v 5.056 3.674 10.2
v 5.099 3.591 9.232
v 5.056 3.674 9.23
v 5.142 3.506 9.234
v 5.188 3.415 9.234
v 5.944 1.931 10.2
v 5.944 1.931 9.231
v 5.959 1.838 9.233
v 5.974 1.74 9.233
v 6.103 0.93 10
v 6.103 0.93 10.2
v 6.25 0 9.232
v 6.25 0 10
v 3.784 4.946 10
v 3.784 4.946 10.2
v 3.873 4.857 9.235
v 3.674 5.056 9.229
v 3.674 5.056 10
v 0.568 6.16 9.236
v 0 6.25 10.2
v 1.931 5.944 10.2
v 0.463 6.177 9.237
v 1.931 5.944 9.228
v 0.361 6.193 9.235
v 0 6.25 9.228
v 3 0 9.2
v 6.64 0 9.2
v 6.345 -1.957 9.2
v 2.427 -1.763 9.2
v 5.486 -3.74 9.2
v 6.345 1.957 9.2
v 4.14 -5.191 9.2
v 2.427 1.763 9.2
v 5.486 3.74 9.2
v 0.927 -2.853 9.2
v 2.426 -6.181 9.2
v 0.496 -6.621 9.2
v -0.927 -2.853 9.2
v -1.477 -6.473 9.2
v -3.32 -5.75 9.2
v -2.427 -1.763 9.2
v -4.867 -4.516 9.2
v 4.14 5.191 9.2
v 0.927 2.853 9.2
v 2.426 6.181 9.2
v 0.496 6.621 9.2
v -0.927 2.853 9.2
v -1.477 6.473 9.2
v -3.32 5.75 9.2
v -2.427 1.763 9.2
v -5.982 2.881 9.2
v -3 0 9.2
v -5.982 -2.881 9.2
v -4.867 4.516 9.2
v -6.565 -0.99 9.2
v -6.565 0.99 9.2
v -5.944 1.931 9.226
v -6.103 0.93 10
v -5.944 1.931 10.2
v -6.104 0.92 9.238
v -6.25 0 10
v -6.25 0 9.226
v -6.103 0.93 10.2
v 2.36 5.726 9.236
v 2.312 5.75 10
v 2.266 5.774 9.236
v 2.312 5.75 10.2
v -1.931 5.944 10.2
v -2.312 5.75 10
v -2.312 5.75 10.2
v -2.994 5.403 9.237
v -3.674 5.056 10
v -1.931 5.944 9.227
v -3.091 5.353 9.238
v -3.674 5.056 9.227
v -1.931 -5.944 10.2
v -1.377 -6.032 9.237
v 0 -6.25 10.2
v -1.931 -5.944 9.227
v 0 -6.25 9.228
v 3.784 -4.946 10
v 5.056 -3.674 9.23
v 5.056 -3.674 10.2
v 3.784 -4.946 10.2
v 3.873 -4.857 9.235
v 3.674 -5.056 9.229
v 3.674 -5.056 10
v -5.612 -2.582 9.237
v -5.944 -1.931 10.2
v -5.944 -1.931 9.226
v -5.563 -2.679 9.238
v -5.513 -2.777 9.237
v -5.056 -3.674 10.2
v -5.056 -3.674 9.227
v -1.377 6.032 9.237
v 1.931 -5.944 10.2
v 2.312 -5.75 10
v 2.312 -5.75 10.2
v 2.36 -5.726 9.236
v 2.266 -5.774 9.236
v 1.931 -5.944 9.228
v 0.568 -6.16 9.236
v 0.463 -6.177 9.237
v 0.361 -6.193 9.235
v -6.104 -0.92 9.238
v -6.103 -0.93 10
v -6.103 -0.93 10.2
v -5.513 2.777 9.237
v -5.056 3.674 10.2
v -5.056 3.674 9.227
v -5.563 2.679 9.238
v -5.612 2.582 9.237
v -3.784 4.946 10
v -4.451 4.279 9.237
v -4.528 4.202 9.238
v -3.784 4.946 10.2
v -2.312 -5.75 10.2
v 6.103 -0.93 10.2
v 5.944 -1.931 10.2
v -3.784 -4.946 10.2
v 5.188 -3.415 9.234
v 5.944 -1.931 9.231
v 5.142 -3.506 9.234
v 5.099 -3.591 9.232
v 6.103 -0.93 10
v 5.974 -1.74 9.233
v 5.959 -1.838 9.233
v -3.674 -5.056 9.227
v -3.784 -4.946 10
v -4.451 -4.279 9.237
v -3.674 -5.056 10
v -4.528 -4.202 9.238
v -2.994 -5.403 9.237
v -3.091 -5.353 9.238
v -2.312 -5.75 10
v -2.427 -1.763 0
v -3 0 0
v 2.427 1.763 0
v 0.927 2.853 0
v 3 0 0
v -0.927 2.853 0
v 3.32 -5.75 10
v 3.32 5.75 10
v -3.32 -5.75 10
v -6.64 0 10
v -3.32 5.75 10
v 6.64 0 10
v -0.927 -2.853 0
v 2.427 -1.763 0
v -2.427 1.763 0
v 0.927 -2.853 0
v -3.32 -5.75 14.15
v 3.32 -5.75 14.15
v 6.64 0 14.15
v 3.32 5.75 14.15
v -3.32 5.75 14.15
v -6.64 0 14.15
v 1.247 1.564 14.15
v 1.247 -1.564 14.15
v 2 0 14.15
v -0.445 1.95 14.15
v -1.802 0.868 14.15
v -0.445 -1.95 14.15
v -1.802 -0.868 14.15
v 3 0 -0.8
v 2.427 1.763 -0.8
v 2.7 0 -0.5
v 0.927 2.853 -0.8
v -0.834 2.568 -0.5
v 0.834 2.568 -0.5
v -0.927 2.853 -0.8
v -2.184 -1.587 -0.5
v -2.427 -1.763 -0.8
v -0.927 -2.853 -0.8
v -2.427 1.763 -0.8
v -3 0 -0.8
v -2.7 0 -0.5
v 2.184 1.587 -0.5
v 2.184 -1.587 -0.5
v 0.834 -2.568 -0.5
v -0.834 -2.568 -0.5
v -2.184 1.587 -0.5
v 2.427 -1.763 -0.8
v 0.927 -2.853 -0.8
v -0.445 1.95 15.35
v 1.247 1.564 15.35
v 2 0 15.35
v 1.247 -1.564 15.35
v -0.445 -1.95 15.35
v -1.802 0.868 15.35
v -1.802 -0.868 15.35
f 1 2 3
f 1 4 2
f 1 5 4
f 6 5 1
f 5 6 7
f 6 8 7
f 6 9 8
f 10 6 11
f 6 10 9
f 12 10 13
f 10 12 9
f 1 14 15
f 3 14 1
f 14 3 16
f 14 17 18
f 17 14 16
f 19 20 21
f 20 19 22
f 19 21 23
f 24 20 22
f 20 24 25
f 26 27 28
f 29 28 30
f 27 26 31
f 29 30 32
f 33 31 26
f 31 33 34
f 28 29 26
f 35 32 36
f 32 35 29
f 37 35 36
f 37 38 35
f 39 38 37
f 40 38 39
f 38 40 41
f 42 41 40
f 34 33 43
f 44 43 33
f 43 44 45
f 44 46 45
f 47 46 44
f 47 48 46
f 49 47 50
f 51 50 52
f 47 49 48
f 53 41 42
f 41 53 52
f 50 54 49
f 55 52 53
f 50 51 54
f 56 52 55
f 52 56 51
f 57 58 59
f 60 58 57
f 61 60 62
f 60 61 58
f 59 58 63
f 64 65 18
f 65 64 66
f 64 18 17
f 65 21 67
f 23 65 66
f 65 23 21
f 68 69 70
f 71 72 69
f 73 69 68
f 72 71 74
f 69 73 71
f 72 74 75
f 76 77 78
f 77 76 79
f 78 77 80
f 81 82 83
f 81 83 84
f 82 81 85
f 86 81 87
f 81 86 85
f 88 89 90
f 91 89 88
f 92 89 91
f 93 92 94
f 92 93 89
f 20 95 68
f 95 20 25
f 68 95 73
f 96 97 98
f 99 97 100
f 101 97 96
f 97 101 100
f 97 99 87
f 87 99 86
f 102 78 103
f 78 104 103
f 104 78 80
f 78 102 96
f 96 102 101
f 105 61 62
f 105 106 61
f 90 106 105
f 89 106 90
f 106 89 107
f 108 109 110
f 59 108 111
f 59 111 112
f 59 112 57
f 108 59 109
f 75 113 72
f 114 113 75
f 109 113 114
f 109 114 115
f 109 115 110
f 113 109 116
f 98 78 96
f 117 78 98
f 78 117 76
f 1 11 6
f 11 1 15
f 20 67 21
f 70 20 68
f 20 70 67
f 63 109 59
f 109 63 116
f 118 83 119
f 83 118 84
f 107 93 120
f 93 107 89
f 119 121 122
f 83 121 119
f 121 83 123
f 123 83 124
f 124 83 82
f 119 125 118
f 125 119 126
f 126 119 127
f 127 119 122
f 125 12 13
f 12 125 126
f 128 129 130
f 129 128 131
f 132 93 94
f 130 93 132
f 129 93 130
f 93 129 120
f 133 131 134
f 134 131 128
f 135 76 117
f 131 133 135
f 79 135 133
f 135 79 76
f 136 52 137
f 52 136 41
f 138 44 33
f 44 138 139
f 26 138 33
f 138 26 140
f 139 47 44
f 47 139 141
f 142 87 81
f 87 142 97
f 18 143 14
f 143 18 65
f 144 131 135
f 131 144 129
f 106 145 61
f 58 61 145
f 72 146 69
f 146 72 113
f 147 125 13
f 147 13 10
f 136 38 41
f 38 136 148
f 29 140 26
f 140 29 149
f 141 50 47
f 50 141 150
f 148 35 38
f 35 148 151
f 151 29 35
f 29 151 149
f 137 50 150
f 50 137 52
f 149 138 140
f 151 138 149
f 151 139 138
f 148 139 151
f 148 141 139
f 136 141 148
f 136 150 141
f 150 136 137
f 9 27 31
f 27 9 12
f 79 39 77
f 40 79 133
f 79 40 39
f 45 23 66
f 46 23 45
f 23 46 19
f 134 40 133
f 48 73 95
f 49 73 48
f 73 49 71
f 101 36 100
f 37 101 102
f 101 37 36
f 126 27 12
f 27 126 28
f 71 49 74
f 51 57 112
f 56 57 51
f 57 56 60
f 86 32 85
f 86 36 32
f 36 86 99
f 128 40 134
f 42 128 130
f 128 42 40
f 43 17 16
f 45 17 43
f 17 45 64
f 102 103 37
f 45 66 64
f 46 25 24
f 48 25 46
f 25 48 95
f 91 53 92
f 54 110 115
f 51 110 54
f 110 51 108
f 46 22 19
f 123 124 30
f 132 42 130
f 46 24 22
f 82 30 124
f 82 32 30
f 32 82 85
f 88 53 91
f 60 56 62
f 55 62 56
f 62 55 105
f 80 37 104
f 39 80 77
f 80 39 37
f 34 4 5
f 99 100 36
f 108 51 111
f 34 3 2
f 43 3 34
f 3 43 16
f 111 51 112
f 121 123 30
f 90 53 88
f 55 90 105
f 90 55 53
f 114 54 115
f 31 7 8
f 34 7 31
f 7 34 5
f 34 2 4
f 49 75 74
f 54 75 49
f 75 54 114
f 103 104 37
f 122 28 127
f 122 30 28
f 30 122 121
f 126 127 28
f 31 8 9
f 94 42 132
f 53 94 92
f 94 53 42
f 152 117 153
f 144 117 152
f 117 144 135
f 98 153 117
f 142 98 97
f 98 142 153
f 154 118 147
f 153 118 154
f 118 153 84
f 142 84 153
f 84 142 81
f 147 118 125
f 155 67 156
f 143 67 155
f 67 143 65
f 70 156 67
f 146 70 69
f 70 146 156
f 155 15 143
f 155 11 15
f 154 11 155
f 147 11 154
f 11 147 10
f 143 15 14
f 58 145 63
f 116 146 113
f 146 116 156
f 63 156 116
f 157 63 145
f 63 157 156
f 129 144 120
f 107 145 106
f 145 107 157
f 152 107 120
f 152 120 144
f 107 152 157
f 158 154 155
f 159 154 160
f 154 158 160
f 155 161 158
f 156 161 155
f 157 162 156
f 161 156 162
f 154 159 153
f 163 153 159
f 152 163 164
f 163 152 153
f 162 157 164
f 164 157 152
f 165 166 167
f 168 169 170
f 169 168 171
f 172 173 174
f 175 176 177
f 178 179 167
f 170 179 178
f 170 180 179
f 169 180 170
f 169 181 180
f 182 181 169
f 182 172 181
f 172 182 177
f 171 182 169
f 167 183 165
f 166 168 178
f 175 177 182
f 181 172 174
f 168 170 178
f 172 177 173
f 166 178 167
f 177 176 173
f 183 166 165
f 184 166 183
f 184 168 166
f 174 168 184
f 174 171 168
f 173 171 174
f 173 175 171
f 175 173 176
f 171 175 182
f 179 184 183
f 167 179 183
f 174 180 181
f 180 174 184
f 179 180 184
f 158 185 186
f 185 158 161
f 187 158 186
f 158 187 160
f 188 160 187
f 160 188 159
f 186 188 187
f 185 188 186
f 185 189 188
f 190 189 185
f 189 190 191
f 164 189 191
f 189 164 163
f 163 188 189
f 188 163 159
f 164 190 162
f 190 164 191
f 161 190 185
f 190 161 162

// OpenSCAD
// Parameters
shaft_diameter = 6.0; //[3.0:12.0:0.1]
shaft_length_under_head = 10.0; //[5.0:20.0:0.1]
head_across_flats = 11.5; //[6.0:23.0:0.1]
head_height = 4.15; //[2.0:8.3:0.05]
chamfer_under_head = 0.3; //[0.1:1.0:0.05]
chamfer_tip = 0.3; //[0.1:1.0:0.05]
overlap = 0.8; //[0.2:2.0:0.1]
washer_thickness = 1.0; //[0.5:3.0:0.1]
washer_outer_diameter = 12.5; //[8.0:25.0:0.1]
washer_inner_clearance = 0.4; //[0.1:1.5:0.05]
buzzer_stub_radius = 2.0; //[1.0:5.0:0.1]
buzzer_stub_height = 2.0; //[1.0:6.0:0.1]

// Hex Head
module hex_head() {
  color("DimGray") {
    translate([0, 0, shaft_length_under_head + head_height / 2])
      cylinder(h = head_height, r = (head_across_flats / 2) / cos(30), center = true, $fn = 6);
  }
}

// Shaft
module shaft() {
  color("Silver") {
    translate([0, 0, shaft_length_under_head / 2])
      cylinder(h = shaft_length_under_head, r = shaft_diameter / 2, center = true);
  }
}

// Under Head Transition Chamfer
module under_head_transition_chamfer() {
  color("DimGray") {
    translate([0, 0, shaft_length_under_head + chamfer_under_head / 2 - overlap])
      cylinder(h = chamfer_under_head, r1 = (head_across_flats / 2) / cos(30), r2 = shaft_diameter / 2, center = true);
  }
}

// Washer Ring
module washer_ring() {
  color("Silver") {
    difference() {
      translate([0, 0, shaft_length_under_head + washer_thickness / 2 - overlap])
        cylinder(h = washer_thickness, r = washer_outer_diameter / 2, center = true);
      translate([0, 0, shaft_length_under_head + washer_thickness / 2 - overlap])
        cylinder(h = washer_thickness + 2 * overlap, r = (shaft_diameter + washer_inner_clearance) / 2, center = true);
    }
  }
}

// Tip Chamfer
module tip_chamfer() {
  color("DimGray") {
    translate([0, 0, chamfer_tip / 2 - overlap])
      cylinder(h = chamfer_tip, r1 = shaft_diameter / 2, r2 = max(shaft_diameter / 2 - chamfer_tip, shaft_diameter / 4), center = true);
  }
}

// Buzzer
module buzzer() {
  color("Black") {
    translate([0, 0, shaft_length_under_head + head_height + buzzer_stub_height / 2 - overlap])
      cylinder(h = buzzer_stub_height, r = buzzer_stub_radius, center = true);
  }
}

// PCB Spacer
module pcb_spacer() {
  color("Silver") {
    translate([0, 0, shaft_length_under_head + washer_thickness / 2 - overlap])
      cylinder(h = washer_thickness, r = washer_outer_diameter / 2, center = true);
  }
}

// Screw and Washer Assembly
module screw_and_washer() {
  union() {
    shaft();
    under_head_transition_chamfer();
    washer_ring();
    hex_head();
    tip_chamfer();
    buzzer();
  }
}

// Final Assembly
module assembly() {
  screw_and_washer();
  pcb_spacer();
}

assembly();
